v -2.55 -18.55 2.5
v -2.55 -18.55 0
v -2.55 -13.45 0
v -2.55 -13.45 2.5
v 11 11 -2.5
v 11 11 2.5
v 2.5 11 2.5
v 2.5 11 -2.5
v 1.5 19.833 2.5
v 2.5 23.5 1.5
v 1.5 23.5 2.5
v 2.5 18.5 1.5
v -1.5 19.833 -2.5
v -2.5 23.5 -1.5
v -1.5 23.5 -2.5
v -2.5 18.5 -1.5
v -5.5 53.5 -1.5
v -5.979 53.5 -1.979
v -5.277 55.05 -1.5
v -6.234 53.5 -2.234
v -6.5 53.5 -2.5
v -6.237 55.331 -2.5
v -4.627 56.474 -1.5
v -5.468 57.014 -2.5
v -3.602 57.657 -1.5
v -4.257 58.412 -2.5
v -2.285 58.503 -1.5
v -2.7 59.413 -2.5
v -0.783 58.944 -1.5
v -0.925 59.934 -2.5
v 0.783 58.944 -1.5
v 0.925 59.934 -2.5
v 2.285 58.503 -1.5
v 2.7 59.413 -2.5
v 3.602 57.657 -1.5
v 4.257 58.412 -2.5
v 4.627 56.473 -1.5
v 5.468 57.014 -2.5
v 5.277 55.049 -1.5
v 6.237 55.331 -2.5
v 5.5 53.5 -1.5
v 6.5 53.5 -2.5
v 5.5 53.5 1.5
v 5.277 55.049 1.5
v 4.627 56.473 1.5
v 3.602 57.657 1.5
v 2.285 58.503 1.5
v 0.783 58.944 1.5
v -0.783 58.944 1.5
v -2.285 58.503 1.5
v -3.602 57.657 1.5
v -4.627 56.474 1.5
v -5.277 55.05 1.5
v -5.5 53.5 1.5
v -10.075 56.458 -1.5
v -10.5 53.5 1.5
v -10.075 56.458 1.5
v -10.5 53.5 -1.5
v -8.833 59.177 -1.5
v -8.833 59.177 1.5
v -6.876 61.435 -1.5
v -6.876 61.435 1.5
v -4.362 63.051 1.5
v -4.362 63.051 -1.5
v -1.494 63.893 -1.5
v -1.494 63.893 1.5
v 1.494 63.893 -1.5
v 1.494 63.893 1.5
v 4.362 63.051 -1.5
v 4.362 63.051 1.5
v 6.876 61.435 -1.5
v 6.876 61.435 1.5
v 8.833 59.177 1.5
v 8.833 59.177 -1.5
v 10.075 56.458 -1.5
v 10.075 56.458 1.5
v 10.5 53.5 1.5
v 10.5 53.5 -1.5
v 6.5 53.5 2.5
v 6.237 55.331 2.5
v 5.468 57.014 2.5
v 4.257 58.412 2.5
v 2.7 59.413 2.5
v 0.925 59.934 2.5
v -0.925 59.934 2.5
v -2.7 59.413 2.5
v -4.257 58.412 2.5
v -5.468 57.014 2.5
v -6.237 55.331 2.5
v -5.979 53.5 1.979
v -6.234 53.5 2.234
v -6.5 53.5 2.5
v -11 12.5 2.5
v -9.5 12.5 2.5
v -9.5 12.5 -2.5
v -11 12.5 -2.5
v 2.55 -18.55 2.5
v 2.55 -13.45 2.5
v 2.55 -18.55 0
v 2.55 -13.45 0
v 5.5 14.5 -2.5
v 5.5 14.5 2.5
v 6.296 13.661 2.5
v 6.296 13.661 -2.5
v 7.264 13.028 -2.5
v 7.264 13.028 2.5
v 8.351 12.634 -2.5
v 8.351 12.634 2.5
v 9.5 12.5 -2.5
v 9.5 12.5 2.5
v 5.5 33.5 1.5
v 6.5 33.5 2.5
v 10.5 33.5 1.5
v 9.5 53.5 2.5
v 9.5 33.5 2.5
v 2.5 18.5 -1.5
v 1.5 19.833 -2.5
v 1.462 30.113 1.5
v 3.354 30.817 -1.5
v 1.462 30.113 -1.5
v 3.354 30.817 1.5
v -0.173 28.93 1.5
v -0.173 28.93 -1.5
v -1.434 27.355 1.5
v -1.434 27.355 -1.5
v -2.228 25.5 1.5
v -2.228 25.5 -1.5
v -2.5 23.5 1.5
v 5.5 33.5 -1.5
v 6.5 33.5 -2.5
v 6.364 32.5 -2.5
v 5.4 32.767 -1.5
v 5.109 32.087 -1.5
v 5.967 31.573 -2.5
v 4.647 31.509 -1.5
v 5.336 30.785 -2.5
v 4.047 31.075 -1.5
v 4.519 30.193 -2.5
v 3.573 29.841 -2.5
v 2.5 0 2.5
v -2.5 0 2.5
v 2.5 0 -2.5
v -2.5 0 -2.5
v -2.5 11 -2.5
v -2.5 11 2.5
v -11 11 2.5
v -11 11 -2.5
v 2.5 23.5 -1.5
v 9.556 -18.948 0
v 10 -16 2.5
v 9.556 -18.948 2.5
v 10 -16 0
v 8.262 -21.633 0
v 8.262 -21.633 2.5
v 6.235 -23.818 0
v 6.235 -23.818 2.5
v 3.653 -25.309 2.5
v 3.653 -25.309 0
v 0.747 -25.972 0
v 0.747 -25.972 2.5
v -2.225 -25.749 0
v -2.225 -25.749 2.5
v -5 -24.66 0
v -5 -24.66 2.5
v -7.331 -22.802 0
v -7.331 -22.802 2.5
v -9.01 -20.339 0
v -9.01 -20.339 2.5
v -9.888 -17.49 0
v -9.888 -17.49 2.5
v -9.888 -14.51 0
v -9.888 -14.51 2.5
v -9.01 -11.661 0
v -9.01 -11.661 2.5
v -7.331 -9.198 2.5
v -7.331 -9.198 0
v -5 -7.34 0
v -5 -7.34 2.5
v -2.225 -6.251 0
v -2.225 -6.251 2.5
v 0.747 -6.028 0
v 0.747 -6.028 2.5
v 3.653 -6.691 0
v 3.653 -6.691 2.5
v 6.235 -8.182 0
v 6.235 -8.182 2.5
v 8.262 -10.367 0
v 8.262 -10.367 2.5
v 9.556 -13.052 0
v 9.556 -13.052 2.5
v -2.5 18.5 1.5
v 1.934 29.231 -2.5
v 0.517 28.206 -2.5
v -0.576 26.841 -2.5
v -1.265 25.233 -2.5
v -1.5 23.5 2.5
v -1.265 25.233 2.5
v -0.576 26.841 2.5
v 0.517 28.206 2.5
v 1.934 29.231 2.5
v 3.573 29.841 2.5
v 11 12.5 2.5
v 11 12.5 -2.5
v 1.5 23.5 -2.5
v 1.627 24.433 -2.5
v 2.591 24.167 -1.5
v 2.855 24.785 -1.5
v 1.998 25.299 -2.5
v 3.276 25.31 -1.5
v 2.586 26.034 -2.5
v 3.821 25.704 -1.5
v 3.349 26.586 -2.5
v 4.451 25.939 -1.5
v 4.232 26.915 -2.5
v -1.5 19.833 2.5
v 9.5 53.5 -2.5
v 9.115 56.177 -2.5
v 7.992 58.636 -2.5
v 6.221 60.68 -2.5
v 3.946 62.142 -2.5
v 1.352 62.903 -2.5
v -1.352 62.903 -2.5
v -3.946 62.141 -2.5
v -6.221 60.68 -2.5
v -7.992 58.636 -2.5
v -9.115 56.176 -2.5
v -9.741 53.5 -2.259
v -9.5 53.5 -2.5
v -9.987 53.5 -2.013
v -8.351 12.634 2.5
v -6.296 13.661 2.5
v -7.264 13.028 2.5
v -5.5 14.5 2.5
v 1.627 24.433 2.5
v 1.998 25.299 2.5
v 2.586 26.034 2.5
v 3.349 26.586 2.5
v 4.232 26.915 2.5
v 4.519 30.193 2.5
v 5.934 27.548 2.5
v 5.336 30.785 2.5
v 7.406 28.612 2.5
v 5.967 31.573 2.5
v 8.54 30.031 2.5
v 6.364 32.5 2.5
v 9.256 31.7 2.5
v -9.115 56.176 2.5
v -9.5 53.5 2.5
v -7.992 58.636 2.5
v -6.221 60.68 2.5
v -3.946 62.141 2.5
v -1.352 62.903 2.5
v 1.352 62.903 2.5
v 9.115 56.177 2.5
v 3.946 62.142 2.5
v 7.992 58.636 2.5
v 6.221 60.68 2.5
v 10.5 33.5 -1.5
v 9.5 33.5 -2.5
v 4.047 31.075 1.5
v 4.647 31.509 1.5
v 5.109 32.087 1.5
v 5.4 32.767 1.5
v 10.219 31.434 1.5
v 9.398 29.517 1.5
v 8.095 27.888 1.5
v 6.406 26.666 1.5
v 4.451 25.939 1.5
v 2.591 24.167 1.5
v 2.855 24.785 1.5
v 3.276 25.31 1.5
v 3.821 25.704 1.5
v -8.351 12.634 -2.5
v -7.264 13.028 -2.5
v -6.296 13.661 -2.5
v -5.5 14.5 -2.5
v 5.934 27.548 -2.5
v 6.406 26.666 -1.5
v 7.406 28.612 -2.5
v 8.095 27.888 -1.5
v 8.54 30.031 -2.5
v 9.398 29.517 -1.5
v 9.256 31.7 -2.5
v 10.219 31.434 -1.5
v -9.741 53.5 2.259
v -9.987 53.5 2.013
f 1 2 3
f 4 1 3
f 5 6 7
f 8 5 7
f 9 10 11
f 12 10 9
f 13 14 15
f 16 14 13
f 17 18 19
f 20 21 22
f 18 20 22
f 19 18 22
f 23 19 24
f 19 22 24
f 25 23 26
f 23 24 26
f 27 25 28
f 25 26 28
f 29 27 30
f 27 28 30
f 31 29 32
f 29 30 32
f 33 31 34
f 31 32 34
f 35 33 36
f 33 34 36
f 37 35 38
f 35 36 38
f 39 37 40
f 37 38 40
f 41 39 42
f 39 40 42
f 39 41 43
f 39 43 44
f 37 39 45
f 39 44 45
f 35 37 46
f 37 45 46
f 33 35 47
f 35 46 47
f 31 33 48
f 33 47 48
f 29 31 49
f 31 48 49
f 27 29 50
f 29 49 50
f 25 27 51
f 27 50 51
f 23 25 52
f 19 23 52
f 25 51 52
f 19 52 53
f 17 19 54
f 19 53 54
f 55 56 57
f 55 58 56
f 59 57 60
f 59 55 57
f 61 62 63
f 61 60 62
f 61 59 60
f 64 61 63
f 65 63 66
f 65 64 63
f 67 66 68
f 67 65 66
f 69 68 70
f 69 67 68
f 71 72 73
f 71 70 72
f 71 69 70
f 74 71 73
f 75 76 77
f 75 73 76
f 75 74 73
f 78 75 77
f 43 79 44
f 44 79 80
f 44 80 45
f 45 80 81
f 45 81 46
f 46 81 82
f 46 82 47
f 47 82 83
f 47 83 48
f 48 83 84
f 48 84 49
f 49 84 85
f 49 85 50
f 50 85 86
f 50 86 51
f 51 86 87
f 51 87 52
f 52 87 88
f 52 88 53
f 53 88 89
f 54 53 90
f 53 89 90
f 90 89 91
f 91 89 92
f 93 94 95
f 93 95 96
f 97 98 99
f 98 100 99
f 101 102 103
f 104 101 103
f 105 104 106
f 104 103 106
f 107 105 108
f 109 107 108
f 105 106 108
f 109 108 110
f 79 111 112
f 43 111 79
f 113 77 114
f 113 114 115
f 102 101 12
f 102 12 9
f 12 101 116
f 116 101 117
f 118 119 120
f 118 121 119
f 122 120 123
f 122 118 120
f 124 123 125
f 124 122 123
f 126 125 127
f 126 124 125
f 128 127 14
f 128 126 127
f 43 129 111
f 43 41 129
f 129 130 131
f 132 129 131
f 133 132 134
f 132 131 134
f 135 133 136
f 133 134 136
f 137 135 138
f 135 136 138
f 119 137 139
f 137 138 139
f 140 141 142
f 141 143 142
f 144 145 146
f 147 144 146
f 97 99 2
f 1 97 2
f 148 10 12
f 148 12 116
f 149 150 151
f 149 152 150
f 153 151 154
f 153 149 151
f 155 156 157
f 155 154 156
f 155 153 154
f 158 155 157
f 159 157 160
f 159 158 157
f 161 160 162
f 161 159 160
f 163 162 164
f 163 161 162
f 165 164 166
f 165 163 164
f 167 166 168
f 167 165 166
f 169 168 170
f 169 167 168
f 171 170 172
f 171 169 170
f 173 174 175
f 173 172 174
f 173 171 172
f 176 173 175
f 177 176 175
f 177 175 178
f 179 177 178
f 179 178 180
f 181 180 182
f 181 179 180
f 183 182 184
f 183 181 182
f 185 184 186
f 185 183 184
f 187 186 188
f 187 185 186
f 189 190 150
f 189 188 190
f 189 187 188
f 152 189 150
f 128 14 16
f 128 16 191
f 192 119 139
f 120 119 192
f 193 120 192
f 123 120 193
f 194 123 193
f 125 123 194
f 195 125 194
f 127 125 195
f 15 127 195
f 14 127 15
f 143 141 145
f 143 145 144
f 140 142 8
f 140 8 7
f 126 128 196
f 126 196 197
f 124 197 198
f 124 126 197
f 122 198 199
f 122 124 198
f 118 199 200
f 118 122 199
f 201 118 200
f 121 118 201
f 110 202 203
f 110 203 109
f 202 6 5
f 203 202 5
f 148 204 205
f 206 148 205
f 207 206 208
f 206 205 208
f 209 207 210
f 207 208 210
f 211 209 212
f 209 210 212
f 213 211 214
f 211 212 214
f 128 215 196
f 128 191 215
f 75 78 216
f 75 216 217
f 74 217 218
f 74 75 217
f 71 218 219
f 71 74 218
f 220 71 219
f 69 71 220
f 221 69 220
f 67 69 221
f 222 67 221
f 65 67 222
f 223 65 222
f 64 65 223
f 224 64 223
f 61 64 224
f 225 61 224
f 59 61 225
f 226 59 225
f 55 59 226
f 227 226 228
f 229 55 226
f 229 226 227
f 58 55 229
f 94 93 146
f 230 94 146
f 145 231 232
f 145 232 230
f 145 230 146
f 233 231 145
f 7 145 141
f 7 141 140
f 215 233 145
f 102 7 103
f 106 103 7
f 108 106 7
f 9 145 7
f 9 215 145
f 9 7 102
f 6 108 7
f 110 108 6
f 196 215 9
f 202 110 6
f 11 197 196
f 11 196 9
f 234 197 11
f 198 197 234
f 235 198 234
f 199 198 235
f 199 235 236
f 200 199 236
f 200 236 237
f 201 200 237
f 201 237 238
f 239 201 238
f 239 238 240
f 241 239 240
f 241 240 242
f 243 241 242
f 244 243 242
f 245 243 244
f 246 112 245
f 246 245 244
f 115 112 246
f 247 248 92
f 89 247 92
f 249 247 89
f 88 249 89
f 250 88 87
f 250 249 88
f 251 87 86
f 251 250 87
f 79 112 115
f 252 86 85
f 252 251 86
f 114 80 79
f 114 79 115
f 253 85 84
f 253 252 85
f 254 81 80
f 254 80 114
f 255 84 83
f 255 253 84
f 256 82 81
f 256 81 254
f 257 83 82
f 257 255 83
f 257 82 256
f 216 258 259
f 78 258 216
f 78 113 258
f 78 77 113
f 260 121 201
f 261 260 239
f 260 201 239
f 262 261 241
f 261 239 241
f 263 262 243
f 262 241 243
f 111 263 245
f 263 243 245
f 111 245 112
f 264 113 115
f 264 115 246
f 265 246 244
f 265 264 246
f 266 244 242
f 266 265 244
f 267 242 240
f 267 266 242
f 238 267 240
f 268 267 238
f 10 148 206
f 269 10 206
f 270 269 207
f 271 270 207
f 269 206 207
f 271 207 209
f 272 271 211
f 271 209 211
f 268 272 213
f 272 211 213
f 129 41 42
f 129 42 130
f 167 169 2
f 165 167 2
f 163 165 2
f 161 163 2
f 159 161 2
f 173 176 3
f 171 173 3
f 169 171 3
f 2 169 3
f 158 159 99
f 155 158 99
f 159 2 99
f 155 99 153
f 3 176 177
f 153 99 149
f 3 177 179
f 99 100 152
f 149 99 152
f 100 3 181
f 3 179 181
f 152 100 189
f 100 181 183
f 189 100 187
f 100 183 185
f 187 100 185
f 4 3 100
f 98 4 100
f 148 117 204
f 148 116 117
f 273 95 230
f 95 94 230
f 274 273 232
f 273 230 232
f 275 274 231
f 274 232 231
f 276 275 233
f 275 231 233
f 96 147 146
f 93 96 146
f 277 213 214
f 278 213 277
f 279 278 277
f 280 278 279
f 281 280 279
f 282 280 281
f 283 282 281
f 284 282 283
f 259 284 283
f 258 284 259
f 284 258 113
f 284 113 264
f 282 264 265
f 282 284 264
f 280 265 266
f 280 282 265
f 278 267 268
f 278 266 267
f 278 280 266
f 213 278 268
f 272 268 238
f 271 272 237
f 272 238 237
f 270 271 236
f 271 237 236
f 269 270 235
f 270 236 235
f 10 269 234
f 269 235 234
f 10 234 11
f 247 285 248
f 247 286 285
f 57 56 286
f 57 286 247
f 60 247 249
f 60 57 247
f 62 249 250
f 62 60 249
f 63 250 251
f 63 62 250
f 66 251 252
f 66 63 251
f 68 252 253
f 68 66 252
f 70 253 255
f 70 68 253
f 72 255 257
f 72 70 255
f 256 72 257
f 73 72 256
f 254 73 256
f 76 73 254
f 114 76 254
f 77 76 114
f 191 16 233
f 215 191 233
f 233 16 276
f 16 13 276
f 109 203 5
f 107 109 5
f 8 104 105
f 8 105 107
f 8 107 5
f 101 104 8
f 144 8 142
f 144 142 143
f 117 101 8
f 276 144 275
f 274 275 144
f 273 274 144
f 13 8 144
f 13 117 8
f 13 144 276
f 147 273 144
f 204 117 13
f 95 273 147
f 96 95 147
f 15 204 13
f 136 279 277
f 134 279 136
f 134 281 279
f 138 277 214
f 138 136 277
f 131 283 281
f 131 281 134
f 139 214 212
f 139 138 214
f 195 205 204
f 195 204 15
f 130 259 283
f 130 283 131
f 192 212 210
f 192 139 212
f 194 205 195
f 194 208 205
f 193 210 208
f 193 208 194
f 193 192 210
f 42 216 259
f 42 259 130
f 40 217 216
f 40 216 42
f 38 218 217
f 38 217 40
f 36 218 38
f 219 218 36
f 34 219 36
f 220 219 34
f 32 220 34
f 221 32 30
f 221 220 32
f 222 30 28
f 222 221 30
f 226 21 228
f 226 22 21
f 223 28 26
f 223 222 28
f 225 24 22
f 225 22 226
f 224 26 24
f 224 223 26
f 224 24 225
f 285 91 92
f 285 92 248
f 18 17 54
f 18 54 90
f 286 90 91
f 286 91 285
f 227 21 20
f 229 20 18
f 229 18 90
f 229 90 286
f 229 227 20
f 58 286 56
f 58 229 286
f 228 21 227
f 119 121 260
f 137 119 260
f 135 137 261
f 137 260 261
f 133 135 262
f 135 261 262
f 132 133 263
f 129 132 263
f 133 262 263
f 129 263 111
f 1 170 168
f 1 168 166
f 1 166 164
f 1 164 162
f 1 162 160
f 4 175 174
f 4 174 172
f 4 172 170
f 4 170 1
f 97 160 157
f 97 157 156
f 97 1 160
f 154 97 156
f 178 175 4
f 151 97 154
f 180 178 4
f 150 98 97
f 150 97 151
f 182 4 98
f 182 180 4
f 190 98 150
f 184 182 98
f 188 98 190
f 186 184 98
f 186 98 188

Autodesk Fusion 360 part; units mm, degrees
sketch "Skizze1" plane through (0, 0, 0) normal (0, 1, 0) x (1, 0, 0)
  line L0 (-2.5, 2.5) -> (2.5, 2.5)
  line L1 (2.5, 2.5) -> (2.5, -2.5)
  line L2 (2.5, -2.5) -> (-2.5, -2.5)
  line L3 (-2.5, -2.5) -> (-2.5, 2.5)
  line L4 (-2.5, 2.5) -> (2.5, -2.5) construction
  line L5 (2.5, 2.5) -> (-2.5, -2.5) construction
  dimension "d1" = 5
extrude "Extrusion1" add sketch "Skizze1" along normal blind 11 makes body 1
sketch "Skizze2" plane through (0, 11, 0) normal (0, 1, 0) x (-1, 0, 0)
  line L0 (2.5, 2.5) -> (-2.5, 2.5)
  line L1 (-2.5, 2.5) -> (-2.5, -2.5)
  line L2 (-2.5, -2.5) -> (2.5, -2.5)
  line L3 (2.5, -2.5) -> (2.5, 2.5)
  line L4 (-11, -2.5) -> (11, -2.5)
  line L5 (11, -2.5) -> (11, 2.5)
  line L6 (11, 2.5) -> (-11, 2.5)
  line L7 (-11, 2.5) -> (-11, -2.5)
  line L8 (-11, -2.5) -> (11, 2.5) construction
  line L9 (11, -2.5) -> (-11, 2.5) construction
  dimension "d4" = 22
extrude "Extrusion2" add sketch "Skizze2" along normal blind 1.5 bodies 1
sketch "Skizze3" plane through (0, 0, -2.5) normal (0, 0, -1) x (-1, 0, 0)
  line L0 (-2.5, 0) -> (2.5, 0)
  line L1 (2.5, 0) -> (2.5, 11)
  line L2 (2.5, 11) -> (11, 11)
  line L3 (11, 11) -> (11, 12.5)
  line L4 (11, 12.5) -> (-11, 12.5)
  line L5 (-11, 12.5) -> (-11, 11)
  line L6 (-11, 11) -> (-2.5, 11)
  line L7 (-2.5, 11) -> (-2.5, 0)
  line L8 (-7, 12.5) -> (-2.5, 18.5)
  line L9 (-2.5, 18.5) -> (2.5, 18.5)
  line L10 (2.5, 18.5) -> (7, 12.5)
  line L11 (0, 18.5) -> (0, 12.5) construction
  dimension "d7" = 6
  dimension "d8" = 14
extrude "Extrusion3" add sketch "Skizze3" against normal blind 5 contours L4 L8 L9 L10 bodies 1
sketch "Skizze4" plane through (0, 0, 0) normal (0, 0, 1) x (1, 0, 0)
  line L0 (0, 18.5) -> (0, 23.5)
  arc A0 (3.9024, 28.378) -> (0, 23.5) centre (5, 23.5) ccw
  arc A1 (3.9024, 28.378) -> (8, 33.5) centre (2.75, 33.5) ccw
  line L1 (8, 33.5) -> (8, 53.5)
  arc A2 (8, 53.5) -> (-8, 53.5) centre (0, 53.5) ccw
  line L2 (2.5, 18.5) -> (-2.5, 18.5)
  dimension "d11" = 2.5
  dimension "d12" = 5
  dimension "d13" = 20
  dimension "d14" = 8
  dimension "d15" = 5
  dimension "d16" = 15
sweep "Sweeping1" add 1 faces at (0.8333, 18.5, -0.8333) path "Skizze4" along L0 A0 A1 L1 A2 on bodies 1 bodies 1
chamfer "Fase1" distance 1 angle 45 20 edges at (-0.8565, 28.1852, 2.5) (4.8974, 31.7821, 2.5) (5.5, 43.5, 2.5) (0, 59, 2.5) (-2.5, 21, 2.5) (8.8017, 28.6586, 2.5) (10.5, 43.5, 2.5) (0, 64, 2.5) (2.5, 21, 2.5) (3.0478, 25.0617, 2.5) (-0.8565, 28.1852, -2.5) (4.8974, 31.7821, -2.5) (5.5, 43.5, -2.5) (0, 59, -2.5) (-2.5, 21, -2.5) (3.0478, 25.0617, -2.5) (8.8017, 28.6586, -2.5) (10.5, 43.5, -2.5) (0, 64, -2.5) (2.5, 21, -2.5) on bodies 1
sketch "Skizze5" plane through (0, 0, 0) normal (0, 0, 1) x (1, 0, 0)
  circle A0 centre (0, -16) radius 10
  line L0 (-2.55, -13.45) -> (2.55, -13.45)
  line L1 (2.55, -13.45) -> (2.55, -18.55)
  line L2 (2.55, -18.55) -> (-2.55, -18.55)
  line L3 (-2.55, -18.55) -> (-2.55, -13.45)
  line L4 (-2.55, -13.45) -> (2.55, -18.55) construction
  line L5 (2.55, -13.45) -> (-2.55, -18.55) construction
  point P0 (0, -16)
  dimension "d24" = 20
  dimension "d25" = 5.1
  dimension "d26" = 16
extrude "Extrusion4" add sketch "Skizze5" along normal up to surface (2.5 mm away) separate body makes body 2
fillet "Abrundung1" radius 5 2 edges at (-7, 12.5, 0) (7, 12.5, 0) on bodies 1
